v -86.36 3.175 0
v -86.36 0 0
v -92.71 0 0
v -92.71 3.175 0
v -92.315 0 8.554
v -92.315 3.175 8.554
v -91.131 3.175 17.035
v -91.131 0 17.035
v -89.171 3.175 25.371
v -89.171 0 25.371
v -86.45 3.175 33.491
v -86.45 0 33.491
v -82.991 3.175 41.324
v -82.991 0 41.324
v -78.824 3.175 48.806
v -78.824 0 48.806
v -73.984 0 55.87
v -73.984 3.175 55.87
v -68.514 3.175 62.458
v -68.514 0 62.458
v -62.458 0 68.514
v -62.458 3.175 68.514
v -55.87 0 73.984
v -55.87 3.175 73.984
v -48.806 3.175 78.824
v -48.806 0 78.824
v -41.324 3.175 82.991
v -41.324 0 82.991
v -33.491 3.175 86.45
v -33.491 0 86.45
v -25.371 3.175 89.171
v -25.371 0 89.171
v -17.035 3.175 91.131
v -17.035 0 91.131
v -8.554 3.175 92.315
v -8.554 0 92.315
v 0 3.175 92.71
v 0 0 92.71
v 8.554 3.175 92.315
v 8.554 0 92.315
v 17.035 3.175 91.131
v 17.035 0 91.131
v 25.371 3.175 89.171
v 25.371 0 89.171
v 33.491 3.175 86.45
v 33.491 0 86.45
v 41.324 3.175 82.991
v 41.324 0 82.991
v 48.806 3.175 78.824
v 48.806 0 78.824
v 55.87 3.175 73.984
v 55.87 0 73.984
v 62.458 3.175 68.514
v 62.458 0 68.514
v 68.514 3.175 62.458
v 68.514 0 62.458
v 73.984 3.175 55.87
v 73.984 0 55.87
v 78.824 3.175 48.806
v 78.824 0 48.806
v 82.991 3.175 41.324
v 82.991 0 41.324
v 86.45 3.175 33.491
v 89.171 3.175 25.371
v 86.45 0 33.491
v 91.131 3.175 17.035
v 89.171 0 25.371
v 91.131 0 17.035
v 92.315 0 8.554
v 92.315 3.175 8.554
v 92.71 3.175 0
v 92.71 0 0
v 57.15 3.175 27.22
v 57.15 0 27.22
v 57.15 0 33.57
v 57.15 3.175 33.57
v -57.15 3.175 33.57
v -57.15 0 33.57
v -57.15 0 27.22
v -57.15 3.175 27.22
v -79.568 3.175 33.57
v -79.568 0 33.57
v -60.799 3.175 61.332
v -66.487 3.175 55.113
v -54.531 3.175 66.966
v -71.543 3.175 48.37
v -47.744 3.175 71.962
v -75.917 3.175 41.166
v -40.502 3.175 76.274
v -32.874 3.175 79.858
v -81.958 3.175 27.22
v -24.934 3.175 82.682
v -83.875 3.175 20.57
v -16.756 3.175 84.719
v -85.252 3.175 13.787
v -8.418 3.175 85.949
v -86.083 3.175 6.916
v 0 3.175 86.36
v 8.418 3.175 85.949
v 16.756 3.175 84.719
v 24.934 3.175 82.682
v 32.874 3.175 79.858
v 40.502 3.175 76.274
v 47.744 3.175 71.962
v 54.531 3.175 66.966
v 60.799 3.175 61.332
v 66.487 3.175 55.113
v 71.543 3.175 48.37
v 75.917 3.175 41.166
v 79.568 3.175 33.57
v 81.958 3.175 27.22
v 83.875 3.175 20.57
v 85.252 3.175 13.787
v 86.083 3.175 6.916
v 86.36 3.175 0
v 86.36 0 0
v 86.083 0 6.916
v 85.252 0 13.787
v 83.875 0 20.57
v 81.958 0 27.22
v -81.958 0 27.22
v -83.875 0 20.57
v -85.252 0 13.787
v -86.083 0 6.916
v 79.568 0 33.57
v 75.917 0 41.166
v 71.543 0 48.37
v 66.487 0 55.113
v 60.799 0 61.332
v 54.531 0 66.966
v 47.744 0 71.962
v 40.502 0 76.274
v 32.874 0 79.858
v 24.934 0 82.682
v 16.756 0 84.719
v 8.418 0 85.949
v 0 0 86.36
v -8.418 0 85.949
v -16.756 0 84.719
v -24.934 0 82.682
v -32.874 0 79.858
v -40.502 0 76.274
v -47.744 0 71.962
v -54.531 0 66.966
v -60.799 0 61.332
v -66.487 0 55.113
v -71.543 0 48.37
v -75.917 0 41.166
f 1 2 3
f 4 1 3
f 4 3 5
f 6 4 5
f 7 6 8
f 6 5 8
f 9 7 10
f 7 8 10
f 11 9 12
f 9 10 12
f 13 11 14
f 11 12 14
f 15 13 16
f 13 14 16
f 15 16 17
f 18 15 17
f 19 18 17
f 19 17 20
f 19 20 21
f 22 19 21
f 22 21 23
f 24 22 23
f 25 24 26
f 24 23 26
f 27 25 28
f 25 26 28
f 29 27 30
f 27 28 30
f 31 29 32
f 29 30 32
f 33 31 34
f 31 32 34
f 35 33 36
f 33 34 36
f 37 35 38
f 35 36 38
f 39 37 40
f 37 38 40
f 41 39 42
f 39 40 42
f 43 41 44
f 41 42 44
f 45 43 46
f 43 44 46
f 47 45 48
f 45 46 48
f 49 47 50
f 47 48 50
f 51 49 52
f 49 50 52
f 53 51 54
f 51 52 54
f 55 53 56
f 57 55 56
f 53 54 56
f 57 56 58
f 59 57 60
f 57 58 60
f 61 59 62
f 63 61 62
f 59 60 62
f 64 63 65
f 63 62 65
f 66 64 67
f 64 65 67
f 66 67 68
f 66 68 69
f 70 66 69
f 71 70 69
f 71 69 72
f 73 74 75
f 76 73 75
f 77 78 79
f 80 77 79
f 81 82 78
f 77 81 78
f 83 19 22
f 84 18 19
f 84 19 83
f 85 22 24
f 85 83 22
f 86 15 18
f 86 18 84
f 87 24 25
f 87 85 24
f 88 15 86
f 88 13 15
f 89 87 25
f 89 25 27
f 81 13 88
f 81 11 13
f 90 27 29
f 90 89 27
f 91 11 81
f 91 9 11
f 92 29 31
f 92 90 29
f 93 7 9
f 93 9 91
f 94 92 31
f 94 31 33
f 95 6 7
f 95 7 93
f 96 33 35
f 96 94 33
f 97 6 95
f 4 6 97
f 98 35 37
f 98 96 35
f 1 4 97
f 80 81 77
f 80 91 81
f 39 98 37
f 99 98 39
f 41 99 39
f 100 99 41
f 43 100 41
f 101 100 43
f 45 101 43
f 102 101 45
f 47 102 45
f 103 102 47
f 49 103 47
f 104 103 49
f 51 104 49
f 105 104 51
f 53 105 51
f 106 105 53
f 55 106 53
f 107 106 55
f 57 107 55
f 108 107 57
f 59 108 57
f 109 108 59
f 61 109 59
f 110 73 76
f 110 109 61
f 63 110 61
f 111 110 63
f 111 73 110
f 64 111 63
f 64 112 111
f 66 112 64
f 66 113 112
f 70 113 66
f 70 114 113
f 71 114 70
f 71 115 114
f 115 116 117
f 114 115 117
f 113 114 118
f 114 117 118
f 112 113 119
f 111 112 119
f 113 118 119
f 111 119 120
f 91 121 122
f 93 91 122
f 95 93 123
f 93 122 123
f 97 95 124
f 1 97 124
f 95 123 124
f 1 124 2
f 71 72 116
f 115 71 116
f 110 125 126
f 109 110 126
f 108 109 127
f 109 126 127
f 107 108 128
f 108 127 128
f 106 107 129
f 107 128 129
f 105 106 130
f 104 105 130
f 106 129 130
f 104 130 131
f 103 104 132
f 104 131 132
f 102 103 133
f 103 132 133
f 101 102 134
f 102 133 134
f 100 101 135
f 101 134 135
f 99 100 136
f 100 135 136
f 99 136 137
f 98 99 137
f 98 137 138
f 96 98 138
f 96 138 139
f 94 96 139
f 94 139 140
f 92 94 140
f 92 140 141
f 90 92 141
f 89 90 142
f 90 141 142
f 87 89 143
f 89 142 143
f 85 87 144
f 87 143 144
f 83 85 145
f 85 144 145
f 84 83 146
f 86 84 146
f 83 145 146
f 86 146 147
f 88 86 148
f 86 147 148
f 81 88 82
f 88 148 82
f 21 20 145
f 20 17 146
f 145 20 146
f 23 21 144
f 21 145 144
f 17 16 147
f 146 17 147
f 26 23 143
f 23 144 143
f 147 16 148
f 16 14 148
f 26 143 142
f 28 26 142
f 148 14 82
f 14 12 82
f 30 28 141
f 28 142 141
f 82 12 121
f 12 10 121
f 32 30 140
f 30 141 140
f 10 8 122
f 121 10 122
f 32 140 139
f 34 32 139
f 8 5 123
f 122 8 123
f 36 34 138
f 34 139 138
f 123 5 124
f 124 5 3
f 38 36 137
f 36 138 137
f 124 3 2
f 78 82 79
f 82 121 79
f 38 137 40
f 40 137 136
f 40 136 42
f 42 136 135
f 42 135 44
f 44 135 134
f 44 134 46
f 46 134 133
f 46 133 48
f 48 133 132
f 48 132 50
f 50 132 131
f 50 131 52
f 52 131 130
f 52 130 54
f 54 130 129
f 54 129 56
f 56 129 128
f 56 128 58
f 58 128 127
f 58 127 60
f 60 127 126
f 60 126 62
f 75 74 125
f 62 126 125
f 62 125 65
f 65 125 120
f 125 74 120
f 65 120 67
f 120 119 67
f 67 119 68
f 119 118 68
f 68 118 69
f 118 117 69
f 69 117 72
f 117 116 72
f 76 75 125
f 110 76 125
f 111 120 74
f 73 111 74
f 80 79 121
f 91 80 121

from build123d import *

# Parameters (mm, degrees)
BOSS_EXTRUDE1_DEPTH = 3.175


with BuildPart() as part:
    # Sketch1 → Boss-Extrude1 (new body)
    with BuildSketch(Plane(origin=(0, 0, 0), x_dir=(1, 0, 0), z_dir=(0, 1, 0))):
        with BuildLine():
            Line((-57.15, -27.220431682), (-81.957901993, -27.220431682))
            ThreePointArc((-81.957901993, -27.220431682), (-80.82536417, -30.418910347), (-79.568057138, -33.570431682))
            Line((-79.568057138, -33.570431682), (-57.15, -33.570431682))
            Line((-57.15, -33.570431682), (-57.15, -27.220431682))
        make_face()
        with BuildLine():
            Line((-86.36, 0), (-92.71, 0))
            ThreePointArc((-92.71, 0), (0, -92.71), (92.71, 0))
            Line((92.71, 0), (86.36, 0))
            ThreePointArc((86.36, 0), (85.252372448, -13.787044351), (81.957901993, -27.220431682))
            Line((81.957901993, -27.220431682), (81.957901993, -33.570431682))
            Line((81.957901993, -33.570431682), (79.568057138, -33.570431682))
            ThreePointArc((79.568057138, -33.570431682), (0, -86.36), (-79.568057138, -33.570431682))
            Line((-79.568057138, -33.570431682), (-81.957901993, -33.570431682))
            Line((-81.957901993, -33.570431682), (-81.957901993, -27.220431682))
            ThreePointArc((-81.957901993, -27.220431682), (-85.252372448, -13.787044351), (-86.36, 0))
        make_face()
        with BuildLine():
            ThreePointArc((-79.568057138, -33.570431682), (-80.82536417, -30.418910347), (-81.957901993, -27.220431682))
            Line((-81.957901993, -27.220431682), (-81.957901993, -33.570431682))
            Line((-81.957901993, -33.570431682), (-79.568057138, -33.570431682))
        make_face()
        with BuildLine():
            Line((81.957901993, -33.570431682), (81.957901993, -27.220431682))
            ThreePointArc((81.957901993, -27.220431682), (80.82536417, -30.418910347), (79.568057138, -33.570431682))
            Line((79.568057138, -33.570431682), (81.957901993, -33.570431682))
        make_face()
        with BuildLine():
            ThreePointArc((79.568057138, -33.570431682), (80.82536417, -30.418910347), (81.957901993, -27.220431682))
            Line((81.957901993, -27.220431682), (57.15, -27.220431682))
            Line((57.15, -27.220431682), (57.15, -33.570431682))
            Line((57.15, -33.570431682), (79.568057138, -33.570431682))
        make_face()
    extrude(amount=BOSS_EXTRUDE1_DEPTH)


solid = part.part
